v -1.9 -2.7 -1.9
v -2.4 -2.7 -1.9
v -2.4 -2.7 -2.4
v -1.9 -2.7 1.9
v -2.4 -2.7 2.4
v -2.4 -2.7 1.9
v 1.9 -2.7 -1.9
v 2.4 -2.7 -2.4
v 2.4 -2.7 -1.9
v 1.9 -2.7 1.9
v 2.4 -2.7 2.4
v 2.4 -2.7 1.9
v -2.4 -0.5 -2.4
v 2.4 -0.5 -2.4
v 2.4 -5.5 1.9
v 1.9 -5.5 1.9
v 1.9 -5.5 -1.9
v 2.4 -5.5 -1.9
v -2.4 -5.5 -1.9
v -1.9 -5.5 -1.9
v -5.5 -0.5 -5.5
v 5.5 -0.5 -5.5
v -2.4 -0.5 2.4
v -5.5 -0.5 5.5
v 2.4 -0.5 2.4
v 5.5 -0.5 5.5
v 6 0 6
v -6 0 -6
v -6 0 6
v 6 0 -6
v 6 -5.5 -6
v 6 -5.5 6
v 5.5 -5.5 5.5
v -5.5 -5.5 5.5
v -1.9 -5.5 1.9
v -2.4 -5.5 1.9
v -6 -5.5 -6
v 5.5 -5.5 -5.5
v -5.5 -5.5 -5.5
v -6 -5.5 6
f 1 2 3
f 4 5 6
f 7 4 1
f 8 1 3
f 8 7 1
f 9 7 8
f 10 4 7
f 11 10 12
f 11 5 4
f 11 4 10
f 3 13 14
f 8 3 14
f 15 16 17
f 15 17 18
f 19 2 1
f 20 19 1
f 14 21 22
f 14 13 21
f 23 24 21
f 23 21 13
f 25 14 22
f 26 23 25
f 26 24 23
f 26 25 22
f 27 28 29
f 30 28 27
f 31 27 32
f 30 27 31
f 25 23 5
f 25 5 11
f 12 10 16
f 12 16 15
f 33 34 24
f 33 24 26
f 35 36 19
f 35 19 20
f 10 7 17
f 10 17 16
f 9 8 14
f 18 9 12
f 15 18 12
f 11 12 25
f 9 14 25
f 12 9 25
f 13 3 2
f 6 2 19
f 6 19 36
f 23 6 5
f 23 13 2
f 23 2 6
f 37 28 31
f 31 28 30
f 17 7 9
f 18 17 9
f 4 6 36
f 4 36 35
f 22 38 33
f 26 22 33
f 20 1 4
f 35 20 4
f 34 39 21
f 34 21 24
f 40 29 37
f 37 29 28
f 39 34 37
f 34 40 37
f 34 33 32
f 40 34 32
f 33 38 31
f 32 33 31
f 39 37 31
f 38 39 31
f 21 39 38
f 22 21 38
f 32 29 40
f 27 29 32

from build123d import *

# Parameters (mm, degrees)
SKETCH1_W           = 12
SKETCH1_H           = 12
BOSS_EXTRUDE1_DEPTH = 5.5
SKETCH2_W           = 11
SKETCH2_H           = 11
CUT_EXTRUDE1_DEPTH  = 5
SKETCH3_W           = 4.8
SKETCH3_H           = 4.8
BOSS_EXTRUDE2_DEPTH = 2.2
SKETCH4_W           = 0.5
SKETCH4_H           = 3.8
BOSS_EXTRUDE3_DEPTH = 2.8
SKETCH5_W           = 0.5
SKETCH5_H           = 3.8
BOSS_EXTRUDE4_DEPTH = 2.8


with BuildPart() as part:
    # Sketch1 → Boss-Extrude1 (new body)
    with BuildSketch(Plane(origin=(0, 0, 0), x_dir=(1, 0, 0), z_dir=(0, 1, 0))):
        Rectangle(SKETCH1_W, SKETCH1_H)
    extrude(amount=-BOSS_EXTRUDE1_DEPTH)

    # Sketch2 → Cut-Extrude1 (cut)
    with BuildSketch(Plane.XZ.offset(5.5)):
        Rectangle(SKETCH2_W, SKETCH2_H)
    extrude(amount=-CUT_EXTRUDE1_DEPTH, mode=Mode.SUBTRACT)

    # Sketch3 → Boss-Extrude2 (add)
    with BuildSketch(Plane.XZ.offset(0.5)):
        Rectangle(SKETCH3_W, SKETCH3_H)
    extrude(amount=BOSS_EXTRUDE2_DEPTH)

    # Sketch4 → Boss-Extrude3 (add)
    with BuildSketch(Plane.XZ.offset(2.7)):
        with Locations((-2.15, 0)):
            Rectangle(SKETCH4_W, SKETCH4_H)
    extrude(amount=BOSS_EXTRUDE3_DEPTH)

    # Sketch5 → Boss-Extrude4 (add)
    with BuildSketch(Plane.XZ.offset(2.7)):
        with Locations((2.15, 0)):
            Rectangle(SKETCH5_W, SKETCH5_H)
    extrude(amount=BOSS_EXTRUDE4_DEPTH)


solid = part.part
